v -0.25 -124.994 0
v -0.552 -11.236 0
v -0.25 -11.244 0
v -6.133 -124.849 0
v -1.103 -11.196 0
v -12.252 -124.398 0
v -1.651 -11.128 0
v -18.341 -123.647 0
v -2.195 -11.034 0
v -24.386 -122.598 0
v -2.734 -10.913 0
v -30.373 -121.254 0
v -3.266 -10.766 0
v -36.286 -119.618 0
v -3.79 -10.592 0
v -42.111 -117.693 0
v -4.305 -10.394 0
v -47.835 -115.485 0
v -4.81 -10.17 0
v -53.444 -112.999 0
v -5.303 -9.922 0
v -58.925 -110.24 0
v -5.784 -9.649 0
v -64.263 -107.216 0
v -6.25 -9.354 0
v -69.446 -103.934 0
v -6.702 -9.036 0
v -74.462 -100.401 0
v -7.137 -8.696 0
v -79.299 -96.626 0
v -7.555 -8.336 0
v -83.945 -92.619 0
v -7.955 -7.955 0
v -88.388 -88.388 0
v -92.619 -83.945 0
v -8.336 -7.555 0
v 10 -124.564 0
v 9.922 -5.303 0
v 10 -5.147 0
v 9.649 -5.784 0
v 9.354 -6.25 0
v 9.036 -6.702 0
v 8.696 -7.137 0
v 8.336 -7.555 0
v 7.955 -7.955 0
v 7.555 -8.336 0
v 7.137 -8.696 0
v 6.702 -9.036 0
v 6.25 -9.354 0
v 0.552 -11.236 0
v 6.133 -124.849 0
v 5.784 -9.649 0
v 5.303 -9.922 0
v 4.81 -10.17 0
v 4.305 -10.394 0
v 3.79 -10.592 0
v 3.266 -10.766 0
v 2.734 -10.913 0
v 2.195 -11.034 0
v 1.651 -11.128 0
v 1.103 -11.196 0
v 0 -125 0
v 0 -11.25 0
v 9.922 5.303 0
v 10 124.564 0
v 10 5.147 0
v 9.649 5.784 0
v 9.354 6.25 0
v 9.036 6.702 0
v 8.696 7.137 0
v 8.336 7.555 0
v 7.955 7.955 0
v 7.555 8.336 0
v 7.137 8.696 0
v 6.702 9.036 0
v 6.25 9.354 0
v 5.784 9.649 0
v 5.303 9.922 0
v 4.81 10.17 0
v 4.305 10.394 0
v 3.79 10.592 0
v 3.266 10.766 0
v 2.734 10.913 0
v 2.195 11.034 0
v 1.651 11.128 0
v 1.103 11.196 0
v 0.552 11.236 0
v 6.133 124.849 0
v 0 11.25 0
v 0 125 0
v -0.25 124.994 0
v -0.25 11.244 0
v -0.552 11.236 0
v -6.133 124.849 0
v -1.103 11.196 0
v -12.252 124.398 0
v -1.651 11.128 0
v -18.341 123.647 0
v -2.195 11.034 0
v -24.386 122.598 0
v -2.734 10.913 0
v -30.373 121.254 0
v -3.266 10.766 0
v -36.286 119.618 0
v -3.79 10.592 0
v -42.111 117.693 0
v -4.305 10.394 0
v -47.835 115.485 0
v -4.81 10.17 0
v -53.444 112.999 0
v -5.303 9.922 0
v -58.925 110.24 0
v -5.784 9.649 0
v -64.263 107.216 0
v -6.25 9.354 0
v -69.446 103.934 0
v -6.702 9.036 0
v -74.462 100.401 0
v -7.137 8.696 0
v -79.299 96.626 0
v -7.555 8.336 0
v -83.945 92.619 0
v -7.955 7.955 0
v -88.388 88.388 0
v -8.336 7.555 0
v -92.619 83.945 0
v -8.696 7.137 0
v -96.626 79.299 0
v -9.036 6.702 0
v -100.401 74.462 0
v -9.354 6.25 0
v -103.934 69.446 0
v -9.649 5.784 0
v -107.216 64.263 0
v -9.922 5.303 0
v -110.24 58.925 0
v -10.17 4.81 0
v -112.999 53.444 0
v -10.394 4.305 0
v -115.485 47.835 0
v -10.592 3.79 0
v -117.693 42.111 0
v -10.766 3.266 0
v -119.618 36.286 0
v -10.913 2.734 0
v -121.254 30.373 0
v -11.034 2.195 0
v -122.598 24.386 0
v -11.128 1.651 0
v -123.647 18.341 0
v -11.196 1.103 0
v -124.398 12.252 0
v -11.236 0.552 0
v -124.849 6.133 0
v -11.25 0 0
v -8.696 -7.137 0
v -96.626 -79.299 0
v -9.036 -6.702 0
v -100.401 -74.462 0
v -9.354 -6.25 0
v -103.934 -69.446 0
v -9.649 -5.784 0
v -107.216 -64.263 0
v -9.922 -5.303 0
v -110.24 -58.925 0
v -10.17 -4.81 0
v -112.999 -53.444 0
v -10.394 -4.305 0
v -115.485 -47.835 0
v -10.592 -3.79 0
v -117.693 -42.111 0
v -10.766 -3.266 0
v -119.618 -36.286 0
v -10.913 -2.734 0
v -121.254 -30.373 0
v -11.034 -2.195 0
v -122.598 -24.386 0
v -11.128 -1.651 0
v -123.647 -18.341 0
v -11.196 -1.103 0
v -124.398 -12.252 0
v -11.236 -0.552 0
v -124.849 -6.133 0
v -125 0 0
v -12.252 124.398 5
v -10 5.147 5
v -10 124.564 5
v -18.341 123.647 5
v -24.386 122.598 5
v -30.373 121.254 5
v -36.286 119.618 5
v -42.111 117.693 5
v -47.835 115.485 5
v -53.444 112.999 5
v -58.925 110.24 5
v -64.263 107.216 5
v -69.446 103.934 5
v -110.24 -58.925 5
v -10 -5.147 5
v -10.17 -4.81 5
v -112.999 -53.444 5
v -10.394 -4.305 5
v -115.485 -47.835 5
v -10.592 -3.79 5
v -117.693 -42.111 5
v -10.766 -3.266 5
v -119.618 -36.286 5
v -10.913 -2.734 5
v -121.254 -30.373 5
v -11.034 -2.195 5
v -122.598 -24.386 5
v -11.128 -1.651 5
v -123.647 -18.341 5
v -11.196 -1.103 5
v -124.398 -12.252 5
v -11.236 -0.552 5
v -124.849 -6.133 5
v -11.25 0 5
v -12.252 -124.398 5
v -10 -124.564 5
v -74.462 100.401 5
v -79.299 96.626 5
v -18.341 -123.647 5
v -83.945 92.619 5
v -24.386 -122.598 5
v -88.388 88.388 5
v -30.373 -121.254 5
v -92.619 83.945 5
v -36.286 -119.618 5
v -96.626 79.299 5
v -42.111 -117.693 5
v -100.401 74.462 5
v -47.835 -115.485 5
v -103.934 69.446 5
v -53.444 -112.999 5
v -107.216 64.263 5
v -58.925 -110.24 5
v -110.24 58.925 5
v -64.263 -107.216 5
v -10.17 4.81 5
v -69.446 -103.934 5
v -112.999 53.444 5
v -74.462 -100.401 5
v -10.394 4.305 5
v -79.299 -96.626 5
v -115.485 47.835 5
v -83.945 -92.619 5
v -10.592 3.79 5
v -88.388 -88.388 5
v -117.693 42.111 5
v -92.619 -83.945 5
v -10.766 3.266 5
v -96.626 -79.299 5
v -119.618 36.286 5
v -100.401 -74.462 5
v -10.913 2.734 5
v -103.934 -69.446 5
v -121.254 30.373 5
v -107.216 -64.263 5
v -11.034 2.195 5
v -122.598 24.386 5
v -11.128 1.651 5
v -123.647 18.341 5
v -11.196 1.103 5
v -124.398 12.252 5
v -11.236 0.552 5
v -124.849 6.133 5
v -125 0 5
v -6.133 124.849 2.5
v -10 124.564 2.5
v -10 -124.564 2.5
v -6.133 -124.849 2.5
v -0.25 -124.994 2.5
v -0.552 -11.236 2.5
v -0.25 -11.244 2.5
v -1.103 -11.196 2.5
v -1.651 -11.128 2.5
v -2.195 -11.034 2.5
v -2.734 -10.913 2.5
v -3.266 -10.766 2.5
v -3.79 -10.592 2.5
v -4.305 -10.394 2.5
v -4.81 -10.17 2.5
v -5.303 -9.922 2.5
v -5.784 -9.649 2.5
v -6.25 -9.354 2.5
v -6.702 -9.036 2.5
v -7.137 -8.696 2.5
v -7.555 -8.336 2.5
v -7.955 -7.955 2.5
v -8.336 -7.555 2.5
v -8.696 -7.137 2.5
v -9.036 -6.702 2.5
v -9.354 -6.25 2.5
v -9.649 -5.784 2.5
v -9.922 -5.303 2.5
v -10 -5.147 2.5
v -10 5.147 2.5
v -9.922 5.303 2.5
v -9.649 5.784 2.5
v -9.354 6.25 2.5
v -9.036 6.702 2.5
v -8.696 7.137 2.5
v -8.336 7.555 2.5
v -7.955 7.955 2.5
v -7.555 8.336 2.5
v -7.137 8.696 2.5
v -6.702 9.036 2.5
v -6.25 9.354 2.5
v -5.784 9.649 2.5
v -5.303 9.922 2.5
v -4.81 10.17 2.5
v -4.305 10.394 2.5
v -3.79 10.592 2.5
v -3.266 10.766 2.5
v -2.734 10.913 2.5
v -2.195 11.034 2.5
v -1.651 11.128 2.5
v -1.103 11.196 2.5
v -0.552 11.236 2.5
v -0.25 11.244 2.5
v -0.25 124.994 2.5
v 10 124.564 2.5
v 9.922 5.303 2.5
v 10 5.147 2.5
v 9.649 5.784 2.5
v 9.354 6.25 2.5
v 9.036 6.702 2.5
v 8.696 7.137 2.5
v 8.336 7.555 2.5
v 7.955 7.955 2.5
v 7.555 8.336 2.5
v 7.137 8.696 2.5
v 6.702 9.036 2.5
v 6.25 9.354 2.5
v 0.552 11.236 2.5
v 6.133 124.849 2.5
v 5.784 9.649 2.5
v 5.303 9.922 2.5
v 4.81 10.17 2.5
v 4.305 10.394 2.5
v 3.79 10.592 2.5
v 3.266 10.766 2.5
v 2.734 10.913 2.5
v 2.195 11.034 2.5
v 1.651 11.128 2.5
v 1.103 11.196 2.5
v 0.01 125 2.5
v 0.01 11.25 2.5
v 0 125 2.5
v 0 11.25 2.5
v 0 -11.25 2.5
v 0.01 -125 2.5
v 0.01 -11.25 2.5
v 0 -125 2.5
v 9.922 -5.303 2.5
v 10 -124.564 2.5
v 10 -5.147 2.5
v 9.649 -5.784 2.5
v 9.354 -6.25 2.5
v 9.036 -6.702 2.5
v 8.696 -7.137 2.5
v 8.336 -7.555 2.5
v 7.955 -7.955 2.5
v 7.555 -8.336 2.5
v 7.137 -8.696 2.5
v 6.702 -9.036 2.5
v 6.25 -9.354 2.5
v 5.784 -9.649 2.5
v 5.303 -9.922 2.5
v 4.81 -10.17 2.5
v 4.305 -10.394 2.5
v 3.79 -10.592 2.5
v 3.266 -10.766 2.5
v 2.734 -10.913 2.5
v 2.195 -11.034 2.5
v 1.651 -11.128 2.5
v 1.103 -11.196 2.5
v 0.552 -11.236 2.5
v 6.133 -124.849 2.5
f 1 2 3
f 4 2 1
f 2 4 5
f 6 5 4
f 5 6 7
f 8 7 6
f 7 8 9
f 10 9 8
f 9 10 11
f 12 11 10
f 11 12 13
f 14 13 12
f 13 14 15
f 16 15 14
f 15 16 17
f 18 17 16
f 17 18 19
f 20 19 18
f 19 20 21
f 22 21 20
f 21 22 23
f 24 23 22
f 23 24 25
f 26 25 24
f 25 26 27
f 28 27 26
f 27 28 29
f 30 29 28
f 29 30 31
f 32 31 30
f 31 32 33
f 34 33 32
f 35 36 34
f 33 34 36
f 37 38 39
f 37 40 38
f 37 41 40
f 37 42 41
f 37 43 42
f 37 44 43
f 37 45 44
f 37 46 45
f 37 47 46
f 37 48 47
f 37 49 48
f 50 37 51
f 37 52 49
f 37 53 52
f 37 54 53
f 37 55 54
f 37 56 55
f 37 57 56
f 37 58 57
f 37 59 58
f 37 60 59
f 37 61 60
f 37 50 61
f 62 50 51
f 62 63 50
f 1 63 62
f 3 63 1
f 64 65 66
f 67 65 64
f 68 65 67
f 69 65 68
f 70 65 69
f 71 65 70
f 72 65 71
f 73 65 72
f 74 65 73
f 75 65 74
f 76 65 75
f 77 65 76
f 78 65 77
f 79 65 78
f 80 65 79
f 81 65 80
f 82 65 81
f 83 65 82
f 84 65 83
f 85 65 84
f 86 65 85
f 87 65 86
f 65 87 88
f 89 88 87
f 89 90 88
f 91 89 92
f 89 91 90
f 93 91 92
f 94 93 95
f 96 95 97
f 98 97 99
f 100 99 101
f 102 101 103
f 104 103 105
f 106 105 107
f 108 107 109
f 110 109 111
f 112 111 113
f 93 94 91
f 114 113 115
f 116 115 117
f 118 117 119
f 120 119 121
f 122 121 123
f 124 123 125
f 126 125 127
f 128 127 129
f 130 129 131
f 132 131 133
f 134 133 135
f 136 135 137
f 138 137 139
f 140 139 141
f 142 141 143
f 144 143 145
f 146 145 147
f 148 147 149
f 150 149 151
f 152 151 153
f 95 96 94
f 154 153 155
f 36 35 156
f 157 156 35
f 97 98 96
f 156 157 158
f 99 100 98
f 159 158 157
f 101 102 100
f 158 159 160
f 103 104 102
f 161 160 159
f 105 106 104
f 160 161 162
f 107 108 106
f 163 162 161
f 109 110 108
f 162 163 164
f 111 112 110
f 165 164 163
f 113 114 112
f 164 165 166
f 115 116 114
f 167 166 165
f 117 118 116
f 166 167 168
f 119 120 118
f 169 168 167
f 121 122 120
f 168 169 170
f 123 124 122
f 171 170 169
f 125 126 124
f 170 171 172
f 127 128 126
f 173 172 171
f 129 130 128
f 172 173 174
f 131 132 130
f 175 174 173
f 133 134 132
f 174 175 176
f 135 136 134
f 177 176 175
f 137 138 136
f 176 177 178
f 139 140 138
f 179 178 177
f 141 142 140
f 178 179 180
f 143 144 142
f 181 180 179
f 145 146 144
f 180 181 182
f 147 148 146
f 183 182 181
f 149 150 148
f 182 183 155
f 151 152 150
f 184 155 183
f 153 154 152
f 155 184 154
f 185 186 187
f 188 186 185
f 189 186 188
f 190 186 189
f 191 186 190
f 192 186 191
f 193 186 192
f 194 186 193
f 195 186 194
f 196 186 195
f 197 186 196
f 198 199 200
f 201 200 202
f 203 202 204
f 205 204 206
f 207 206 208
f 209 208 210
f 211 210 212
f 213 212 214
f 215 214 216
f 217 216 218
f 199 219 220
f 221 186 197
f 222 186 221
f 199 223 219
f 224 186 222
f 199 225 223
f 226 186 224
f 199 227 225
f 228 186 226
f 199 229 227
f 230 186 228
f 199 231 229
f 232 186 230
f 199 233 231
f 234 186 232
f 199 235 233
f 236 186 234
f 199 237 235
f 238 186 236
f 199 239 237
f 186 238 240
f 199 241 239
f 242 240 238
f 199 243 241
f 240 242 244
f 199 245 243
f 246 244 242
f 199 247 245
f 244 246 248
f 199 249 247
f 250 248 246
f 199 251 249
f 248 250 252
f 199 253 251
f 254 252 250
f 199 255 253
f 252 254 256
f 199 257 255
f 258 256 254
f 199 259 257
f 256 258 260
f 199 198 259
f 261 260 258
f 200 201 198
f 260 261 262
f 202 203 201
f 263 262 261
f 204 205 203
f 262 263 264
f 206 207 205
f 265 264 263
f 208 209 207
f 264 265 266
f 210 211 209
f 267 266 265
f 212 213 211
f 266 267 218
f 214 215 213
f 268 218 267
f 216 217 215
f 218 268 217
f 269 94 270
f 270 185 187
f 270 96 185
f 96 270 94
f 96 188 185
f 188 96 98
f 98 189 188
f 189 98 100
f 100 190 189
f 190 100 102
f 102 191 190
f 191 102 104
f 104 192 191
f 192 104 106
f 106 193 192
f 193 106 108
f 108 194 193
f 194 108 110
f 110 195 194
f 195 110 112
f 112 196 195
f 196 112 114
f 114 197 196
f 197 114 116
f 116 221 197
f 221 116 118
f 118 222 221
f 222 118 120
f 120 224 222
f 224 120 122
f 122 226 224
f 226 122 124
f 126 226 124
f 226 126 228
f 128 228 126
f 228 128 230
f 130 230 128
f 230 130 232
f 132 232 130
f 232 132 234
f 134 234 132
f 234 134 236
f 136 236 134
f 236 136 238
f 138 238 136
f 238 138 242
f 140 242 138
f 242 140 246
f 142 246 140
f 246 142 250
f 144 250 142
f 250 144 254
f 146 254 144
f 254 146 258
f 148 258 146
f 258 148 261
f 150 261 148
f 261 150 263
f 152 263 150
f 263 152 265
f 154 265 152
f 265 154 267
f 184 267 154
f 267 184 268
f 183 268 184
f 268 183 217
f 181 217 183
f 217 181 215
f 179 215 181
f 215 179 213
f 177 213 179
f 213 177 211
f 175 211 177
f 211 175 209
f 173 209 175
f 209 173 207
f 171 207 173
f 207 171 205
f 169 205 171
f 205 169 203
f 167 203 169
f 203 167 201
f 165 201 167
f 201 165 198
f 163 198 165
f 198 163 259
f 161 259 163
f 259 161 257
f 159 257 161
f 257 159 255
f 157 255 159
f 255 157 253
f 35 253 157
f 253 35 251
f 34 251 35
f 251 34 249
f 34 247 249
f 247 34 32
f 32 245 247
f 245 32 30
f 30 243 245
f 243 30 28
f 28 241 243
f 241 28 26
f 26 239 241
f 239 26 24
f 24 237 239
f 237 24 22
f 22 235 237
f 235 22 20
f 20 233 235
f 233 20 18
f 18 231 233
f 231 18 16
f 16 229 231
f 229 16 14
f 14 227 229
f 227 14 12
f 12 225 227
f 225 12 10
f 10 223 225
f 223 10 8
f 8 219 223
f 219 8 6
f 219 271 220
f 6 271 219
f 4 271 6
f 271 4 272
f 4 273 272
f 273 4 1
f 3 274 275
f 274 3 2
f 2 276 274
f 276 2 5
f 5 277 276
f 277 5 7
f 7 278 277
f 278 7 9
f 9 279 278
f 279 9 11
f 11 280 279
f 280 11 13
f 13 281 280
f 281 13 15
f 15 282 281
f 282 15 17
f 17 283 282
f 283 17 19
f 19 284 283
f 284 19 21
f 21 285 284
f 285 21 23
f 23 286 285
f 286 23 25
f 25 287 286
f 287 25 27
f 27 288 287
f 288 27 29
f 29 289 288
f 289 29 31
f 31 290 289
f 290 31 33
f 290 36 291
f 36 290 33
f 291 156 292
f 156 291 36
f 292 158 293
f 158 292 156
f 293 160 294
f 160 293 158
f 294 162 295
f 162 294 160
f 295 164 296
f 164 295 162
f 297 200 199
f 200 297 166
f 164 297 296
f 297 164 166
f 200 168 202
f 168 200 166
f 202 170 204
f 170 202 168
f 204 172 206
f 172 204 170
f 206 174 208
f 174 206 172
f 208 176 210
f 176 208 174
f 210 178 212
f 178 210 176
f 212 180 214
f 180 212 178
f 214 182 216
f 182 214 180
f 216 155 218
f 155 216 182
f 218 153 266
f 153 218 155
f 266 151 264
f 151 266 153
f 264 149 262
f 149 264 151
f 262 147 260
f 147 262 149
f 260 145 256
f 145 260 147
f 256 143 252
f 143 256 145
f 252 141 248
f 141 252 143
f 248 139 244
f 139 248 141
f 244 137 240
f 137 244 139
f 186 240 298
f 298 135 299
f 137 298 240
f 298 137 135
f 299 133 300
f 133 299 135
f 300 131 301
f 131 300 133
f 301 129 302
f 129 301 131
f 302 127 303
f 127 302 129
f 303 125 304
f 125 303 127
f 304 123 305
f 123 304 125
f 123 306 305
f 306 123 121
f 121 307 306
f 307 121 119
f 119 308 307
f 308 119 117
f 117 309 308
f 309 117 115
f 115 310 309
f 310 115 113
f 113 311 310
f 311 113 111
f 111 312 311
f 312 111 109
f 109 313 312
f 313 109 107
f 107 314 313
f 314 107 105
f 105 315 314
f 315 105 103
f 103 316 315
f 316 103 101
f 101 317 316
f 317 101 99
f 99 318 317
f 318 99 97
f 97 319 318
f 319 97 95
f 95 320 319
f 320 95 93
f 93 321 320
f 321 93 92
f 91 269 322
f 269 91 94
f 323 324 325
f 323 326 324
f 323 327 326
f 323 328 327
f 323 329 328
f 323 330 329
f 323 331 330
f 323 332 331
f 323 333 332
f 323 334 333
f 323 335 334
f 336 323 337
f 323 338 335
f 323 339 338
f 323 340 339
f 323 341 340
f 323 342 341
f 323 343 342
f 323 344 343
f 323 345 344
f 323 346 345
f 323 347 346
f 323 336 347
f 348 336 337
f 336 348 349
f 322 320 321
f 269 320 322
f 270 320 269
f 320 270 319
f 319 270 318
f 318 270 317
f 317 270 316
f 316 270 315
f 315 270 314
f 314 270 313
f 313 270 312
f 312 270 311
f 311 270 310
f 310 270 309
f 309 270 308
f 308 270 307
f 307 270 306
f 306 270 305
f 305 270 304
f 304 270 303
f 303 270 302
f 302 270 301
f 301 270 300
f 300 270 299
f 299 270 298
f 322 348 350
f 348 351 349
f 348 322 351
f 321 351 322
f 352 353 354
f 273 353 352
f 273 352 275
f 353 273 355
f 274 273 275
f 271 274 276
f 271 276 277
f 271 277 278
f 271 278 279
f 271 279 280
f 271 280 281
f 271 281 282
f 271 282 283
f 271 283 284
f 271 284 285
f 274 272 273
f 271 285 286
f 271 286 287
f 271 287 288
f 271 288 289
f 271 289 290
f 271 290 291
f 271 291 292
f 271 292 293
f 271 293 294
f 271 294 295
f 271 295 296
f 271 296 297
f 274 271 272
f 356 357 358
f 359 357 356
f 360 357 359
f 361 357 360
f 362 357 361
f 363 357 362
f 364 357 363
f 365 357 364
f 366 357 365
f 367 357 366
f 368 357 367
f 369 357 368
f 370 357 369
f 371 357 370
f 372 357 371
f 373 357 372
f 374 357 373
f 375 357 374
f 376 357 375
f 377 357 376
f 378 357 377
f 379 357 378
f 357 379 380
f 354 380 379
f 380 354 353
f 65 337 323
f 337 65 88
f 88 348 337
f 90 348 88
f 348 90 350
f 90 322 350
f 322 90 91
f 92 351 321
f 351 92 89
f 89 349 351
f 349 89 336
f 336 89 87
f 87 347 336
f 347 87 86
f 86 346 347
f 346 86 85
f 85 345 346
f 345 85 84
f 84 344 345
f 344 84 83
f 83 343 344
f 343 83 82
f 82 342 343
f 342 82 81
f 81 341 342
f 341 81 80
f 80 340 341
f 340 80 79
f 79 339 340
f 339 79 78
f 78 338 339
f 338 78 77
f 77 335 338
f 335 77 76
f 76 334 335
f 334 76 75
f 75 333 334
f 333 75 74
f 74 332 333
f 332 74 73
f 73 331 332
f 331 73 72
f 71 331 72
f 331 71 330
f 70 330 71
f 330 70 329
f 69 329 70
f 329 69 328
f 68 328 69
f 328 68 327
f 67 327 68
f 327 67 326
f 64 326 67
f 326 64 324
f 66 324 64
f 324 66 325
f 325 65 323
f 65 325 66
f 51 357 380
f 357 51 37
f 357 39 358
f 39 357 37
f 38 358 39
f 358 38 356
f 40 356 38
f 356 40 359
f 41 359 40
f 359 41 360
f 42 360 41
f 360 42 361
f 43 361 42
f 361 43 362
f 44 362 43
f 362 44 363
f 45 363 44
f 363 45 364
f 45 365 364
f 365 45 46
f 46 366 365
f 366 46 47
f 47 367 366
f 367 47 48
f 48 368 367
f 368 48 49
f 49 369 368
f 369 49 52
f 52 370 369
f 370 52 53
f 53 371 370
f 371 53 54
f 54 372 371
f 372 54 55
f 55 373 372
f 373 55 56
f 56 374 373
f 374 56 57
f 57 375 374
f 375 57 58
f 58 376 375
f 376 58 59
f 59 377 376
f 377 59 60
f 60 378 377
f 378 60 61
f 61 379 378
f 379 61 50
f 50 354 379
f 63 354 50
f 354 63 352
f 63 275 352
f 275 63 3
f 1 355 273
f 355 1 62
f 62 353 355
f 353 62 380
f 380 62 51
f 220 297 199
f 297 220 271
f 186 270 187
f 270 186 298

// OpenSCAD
// file: ProjectGrace-RigidEndStop-Parts.scad
$fn = 128;

disc_diameter = 250;
disc_thickness = 5;
pipe_slot_width = 22.5;
lap_overlap_width = 10;
lap_seam_overlap = 0.25;
assembly_gap = 12;
assembly_offset = lap_overlap_width + assembly_gap / 2;

module pipe_entry_bore_2d() {
    circle(d = pipe_slot_width);
}

module pipe_entry_slot_2d(is_left) {
    slot_radius = pipe_slot_width / 2;

    intersection() {
        pipe_entry_bore_2d();

        if (is_left)
            translate([-slot_radius, -slot_radius])
                square([slot_radius, pipe_slot_width]);
        else
            translate([0, -slot_radius])
                square([slot_radius, pipe_slot_width]);
    }
}

module disc_half_outline_2d(is_left) {
    difference() {
        intersection() {
            circle(d = disc_diameter);

            if (is_left)
                translate([-disc_diameter / 2, -disc_diameter / 2])
                    square([disc_diameter / 2, disc_diameter]);
            else
                translate([0, -disc_diameter / 2])
                    square([disc_diameter / 2, disc_diameter]);
        }

        // Each half contributes one semicircular notch, forming a round hole when joined.
        pipe_entry_slot_2d(is_left);
    }
}

module lap_shelf_2d(extends_right) {
    difference() {
        intersection() {
            circle(d = disc_diameter);

            if (extends_right)
                translate([-lap_seam_overlap, -disc_diameter / 2 - 1])
                    square([lap_overlap_width + lap_seam_overlap, disc_diameter + 2]);
            else
                translate([-lap_overlap_width, -disc_diameter / 2 - 1])
                    square([lap_overlap_width + lap_seam_overlap, disc_diameter + 2]);
        }

        // Keep the complete pipe bore clear through the overlapping lap shelf.
        pipe_entry_bore_2d();
    }
}

module rigid_end_stop_part_a() {
    half_height = disc_thickness / 2;

    difference() {
        union() {
            linear_extrude(height = disc_thickness)
                disc_half_outline_2d(true);
            linear_extrude(height = half_height)
                lap_shelf_2d(true);
        }

        translate([-lap_overlap_width, -disc_diameter / 2 - 1, half_height])
            cube([lap_overlap_width + 0.01, disc_diameter + 2, half_height + 0.01]);
    }
}

module rigid_end_stop_part_b() {
    half_height = disc_thickness / 2;

    difference() {
        union() {
            linear_extrude(height = disc_thickness)
                disc_half_outline_2d(false);
            translate([0, 0, half_height])
                linear_extrude(height = half_height)
                    lap_shelf_2d(false);
        }

        translate([-0.01, -disc_diameter / 2 - 1, 0])
            cube([lap_overlap_width + 0.01, disc_diameter + 2, half_height]);
    }
}
// main file
// Print Part A flat on its broad base face.

include <ProjectGrace-RigidEndStop-Parts.scad>

color("red")
    rigid_end_stop_part_a();
